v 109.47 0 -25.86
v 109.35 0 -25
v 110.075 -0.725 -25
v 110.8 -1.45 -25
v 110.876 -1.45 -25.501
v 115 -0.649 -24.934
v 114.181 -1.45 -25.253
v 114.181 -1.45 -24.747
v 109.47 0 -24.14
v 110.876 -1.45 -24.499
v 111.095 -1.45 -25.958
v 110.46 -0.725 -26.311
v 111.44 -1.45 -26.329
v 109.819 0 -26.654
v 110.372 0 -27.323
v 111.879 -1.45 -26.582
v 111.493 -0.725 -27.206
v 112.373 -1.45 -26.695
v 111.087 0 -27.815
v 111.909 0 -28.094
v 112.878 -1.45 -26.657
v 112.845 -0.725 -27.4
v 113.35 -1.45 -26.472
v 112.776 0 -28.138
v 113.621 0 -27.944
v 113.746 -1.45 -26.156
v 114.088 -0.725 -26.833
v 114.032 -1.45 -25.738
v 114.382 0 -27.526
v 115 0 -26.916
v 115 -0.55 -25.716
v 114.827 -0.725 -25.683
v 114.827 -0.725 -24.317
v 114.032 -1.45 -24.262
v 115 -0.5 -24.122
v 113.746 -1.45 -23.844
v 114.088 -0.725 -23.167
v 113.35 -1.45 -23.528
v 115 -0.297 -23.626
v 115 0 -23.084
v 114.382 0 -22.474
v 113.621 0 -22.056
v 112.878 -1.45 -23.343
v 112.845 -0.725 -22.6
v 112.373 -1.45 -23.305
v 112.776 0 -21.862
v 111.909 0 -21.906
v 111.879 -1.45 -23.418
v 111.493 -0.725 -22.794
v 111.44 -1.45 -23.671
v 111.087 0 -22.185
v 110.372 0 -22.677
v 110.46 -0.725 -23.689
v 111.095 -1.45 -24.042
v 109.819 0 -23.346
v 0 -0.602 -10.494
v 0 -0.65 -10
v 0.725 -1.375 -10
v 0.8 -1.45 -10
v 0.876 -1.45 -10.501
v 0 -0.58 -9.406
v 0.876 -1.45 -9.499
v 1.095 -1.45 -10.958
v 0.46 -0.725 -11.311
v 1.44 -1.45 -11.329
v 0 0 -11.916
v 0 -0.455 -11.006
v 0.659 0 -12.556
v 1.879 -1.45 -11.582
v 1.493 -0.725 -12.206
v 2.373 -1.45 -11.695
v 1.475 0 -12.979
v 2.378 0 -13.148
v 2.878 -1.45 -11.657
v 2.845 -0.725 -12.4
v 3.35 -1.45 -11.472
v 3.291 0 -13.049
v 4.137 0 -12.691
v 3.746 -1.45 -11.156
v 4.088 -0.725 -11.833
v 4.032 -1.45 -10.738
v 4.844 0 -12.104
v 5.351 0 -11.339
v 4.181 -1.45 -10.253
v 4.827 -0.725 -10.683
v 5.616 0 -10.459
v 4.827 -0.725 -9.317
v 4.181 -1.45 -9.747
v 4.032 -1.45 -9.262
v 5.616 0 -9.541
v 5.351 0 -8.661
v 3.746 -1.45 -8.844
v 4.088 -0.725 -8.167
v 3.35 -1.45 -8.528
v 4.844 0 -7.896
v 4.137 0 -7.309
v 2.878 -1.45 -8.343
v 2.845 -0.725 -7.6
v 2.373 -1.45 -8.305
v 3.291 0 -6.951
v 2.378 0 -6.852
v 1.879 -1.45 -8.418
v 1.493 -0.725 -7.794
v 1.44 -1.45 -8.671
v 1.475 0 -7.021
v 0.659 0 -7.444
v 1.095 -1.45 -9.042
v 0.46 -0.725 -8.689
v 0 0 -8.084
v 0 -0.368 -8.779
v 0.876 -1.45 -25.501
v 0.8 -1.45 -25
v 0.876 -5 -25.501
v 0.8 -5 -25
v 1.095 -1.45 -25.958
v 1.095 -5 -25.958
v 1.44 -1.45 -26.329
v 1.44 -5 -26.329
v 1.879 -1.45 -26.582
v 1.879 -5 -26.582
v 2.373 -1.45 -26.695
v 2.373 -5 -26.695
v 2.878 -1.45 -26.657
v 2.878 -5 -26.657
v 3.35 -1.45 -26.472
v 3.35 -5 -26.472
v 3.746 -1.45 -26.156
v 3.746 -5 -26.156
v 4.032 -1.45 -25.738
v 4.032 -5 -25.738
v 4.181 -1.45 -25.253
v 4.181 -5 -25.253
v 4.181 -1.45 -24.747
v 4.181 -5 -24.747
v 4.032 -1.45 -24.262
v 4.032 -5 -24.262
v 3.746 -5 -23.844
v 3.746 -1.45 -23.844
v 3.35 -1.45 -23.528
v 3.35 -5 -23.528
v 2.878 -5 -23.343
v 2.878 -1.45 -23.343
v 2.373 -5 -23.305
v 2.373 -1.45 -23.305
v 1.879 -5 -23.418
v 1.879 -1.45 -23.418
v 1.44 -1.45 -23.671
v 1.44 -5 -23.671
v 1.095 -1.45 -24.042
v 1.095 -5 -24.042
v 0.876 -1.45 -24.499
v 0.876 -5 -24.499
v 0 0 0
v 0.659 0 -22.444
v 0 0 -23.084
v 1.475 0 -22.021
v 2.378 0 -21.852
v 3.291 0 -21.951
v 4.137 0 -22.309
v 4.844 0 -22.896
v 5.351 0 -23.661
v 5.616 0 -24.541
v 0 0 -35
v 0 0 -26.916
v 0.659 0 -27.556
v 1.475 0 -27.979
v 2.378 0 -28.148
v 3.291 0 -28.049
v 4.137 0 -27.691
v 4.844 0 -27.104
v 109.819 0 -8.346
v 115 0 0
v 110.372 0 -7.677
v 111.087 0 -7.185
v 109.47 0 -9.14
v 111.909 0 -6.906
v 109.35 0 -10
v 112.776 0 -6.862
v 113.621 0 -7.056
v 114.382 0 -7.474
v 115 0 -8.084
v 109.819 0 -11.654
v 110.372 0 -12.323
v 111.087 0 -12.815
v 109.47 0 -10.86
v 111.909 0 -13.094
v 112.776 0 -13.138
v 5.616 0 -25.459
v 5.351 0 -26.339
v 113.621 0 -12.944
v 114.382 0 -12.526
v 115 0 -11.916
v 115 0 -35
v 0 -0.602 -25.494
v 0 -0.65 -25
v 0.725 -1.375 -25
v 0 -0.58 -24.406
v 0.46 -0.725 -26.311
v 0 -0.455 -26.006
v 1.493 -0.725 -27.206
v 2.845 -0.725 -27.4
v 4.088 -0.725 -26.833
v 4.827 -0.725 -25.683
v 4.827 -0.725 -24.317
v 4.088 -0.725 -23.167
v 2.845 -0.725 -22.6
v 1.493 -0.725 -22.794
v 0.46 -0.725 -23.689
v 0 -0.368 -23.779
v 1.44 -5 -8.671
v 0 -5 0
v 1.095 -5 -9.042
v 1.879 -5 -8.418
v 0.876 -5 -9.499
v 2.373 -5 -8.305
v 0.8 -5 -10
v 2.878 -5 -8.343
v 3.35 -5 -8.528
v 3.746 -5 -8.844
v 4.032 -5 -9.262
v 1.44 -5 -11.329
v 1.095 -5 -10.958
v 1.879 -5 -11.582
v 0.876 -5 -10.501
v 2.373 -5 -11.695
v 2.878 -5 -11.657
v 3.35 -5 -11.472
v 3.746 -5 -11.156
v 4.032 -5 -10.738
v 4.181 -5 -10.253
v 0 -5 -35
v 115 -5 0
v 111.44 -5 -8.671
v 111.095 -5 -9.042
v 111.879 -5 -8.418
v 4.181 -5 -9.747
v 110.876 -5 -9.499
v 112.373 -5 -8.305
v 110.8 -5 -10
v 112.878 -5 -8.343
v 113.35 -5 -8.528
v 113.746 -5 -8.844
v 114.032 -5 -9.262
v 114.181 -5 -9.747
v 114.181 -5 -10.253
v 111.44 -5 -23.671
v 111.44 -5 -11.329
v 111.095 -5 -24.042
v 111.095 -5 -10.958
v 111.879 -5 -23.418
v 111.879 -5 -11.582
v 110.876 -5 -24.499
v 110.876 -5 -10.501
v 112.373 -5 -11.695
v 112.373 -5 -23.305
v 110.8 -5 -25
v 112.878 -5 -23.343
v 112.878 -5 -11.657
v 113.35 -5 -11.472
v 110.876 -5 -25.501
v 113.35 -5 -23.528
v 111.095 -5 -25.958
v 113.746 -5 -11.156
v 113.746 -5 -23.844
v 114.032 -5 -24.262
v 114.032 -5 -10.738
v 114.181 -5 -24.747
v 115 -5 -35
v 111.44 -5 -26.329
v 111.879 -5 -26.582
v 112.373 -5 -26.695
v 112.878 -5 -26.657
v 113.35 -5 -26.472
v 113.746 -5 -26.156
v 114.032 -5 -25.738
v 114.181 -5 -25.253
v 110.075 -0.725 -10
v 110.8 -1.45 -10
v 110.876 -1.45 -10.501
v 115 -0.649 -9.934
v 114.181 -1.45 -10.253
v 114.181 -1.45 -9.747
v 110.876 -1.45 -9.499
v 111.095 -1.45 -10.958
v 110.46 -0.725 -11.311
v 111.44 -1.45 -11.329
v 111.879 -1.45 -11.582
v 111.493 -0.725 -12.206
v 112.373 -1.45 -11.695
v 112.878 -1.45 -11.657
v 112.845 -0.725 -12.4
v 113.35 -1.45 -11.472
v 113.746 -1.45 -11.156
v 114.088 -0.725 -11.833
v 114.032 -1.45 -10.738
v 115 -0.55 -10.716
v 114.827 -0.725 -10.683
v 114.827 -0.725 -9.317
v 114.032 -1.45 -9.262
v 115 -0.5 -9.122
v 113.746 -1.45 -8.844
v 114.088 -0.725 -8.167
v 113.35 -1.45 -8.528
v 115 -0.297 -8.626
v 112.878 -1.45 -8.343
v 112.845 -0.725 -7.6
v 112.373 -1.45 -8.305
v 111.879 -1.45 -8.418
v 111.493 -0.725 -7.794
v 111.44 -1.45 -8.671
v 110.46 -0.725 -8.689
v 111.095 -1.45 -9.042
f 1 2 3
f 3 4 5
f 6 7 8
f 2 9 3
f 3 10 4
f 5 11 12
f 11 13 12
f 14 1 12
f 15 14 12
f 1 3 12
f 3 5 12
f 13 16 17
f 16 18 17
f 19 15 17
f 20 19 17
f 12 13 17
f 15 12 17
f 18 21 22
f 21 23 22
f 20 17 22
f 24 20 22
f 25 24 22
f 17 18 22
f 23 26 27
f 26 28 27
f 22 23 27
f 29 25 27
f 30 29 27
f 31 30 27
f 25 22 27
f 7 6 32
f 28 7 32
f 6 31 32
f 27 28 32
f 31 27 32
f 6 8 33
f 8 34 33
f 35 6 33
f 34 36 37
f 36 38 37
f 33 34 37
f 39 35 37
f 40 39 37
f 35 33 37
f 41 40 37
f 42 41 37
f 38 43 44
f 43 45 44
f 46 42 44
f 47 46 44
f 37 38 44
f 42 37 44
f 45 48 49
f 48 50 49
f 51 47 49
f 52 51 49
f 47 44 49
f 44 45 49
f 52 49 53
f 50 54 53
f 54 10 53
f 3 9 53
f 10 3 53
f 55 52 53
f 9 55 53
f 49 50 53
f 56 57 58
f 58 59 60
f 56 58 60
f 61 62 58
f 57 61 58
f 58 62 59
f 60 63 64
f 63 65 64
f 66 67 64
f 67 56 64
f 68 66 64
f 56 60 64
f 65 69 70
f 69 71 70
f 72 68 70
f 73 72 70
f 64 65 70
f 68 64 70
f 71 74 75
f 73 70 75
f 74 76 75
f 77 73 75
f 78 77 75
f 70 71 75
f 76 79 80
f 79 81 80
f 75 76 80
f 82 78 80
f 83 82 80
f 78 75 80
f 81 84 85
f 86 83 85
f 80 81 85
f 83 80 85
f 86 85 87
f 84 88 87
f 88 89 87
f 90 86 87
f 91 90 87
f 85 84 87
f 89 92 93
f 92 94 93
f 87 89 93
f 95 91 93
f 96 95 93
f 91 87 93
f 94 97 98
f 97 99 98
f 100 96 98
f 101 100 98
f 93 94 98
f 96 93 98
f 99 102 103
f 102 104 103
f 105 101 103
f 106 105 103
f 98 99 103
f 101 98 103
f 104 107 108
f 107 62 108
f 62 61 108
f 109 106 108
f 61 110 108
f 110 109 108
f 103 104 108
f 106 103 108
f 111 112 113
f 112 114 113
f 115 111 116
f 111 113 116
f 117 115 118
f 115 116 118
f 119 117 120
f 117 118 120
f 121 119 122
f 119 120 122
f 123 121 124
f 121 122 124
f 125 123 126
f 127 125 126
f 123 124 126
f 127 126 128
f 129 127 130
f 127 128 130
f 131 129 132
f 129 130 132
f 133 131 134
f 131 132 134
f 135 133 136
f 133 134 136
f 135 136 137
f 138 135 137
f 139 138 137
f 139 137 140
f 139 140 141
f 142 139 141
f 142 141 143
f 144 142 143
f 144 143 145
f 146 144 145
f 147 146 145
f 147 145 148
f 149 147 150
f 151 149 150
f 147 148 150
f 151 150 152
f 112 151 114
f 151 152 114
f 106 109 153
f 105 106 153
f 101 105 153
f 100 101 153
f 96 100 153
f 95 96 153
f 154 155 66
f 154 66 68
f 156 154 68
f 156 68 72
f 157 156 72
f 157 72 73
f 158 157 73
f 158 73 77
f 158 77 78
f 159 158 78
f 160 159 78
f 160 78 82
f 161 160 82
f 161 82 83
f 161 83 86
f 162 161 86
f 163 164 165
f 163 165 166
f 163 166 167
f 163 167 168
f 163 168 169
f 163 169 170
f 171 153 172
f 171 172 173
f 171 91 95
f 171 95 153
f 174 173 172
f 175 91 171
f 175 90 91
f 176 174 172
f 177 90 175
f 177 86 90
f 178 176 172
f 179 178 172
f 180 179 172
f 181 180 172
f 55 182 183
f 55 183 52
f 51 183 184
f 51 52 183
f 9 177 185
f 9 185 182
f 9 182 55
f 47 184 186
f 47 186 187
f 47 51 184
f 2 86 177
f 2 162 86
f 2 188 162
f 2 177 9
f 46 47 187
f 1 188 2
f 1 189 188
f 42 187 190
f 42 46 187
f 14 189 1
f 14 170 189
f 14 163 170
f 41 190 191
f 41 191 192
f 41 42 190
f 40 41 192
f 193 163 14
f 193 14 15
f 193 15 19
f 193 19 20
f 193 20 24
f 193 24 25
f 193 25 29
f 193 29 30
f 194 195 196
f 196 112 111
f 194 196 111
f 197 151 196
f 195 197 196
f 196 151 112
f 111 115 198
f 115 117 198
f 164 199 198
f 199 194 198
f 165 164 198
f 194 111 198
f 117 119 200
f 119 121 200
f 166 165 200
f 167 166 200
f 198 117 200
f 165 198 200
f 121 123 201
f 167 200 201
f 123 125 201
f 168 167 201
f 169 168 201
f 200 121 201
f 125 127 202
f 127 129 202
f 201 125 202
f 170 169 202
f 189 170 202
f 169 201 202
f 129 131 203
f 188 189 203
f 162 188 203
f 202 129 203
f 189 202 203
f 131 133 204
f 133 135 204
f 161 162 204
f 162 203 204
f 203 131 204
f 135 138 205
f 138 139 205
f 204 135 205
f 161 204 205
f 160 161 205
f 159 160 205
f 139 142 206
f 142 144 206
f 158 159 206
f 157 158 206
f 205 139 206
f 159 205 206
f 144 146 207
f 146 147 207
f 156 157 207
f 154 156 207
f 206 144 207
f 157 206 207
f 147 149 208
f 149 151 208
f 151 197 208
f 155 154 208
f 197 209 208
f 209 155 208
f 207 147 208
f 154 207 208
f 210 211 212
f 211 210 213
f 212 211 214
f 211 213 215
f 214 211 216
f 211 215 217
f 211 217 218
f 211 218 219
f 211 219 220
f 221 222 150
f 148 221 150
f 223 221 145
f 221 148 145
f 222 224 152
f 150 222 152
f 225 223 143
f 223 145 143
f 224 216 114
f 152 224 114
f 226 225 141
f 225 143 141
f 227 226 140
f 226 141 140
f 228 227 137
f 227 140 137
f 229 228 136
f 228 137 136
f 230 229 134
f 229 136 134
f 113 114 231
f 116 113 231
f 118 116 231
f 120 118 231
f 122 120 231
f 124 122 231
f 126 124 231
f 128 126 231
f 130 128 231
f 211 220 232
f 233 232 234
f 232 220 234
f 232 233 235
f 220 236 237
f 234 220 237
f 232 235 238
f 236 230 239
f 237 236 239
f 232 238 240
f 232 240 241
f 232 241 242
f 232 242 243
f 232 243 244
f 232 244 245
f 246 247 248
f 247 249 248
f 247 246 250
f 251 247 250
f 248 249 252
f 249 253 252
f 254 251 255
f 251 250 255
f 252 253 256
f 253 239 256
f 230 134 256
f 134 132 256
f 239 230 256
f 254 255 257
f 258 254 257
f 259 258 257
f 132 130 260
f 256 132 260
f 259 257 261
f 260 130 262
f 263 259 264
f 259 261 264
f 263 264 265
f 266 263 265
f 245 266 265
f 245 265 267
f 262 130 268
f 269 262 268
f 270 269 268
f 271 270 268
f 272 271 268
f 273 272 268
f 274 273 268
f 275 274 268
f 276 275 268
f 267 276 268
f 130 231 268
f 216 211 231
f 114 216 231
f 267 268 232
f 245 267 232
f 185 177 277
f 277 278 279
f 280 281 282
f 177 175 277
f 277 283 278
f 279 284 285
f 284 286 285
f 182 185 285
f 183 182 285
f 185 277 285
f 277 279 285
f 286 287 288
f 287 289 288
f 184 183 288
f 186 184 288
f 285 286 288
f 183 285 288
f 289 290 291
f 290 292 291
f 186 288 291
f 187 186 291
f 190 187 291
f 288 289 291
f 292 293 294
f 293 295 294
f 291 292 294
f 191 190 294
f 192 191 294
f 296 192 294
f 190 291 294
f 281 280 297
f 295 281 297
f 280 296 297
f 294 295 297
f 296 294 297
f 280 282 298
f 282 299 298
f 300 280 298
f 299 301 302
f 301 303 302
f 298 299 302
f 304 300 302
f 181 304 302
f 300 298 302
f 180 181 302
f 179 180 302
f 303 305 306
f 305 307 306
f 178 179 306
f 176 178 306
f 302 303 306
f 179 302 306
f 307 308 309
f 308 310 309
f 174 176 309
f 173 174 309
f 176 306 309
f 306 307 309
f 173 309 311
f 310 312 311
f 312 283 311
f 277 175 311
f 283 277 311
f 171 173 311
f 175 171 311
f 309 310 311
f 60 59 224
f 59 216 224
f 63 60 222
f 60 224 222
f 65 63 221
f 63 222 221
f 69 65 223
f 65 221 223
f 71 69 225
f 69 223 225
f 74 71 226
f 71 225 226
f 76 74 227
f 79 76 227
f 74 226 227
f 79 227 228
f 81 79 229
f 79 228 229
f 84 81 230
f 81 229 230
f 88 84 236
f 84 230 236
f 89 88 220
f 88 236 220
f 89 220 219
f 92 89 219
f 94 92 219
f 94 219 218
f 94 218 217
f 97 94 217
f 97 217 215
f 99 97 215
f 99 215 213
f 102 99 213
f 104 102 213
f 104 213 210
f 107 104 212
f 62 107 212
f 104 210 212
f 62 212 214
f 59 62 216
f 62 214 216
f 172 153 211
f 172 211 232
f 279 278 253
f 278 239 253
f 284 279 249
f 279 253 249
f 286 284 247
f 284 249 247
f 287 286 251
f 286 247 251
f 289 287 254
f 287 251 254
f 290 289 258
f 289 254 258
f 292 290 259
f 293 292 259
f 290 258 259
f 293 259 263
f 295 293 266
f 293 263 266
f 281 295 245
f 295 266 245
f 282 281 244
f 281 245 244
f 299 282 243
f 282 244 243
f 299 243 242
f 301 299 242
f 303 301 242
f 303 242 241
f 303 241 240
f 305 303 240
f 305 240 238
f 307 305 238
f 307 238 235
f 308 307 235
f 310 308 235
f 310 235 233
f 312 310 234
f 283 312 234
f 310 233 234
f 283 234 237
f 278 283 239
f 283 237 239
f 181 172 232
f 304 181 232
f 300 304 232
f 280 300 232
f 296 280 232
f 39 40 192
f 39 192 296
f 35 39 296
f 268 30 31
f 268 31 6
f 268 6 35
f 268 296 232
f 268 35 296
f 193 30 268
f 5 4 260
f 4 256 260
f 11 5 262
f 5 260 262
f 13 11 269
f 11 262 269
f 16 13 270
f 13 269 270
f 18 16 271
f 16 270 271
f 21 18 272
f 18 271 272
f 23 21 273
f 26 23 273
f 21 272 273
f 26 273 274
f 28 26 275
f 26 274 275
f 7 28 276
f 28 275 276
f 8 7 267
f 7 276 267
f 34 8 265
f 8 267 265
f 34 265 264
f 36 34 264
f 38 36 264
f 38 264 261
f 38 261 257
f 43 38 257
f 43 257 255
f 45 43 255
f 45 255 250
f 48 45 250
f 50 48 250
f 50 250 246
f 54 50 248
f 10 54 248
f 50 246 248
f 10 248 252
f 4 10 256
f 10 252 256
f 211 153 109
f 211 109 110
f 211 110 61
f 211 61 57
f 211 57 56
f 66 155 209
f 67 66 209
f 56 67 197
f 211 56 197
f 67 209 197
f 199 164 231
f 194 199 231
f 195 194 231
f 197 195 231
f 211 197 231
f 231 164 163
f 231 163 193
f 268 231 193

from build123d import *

# Parameters (mm, degrees)
SKETCH1_W                                           = 115
SKETCH1_H                                           = 35
BOSS_EXTRUDE1_DEPTH                                 = 5
CSK_FOR_M3_FLAT_COUNTERSUNK_HEAD_SCREW1_D           = 3.4
CSK_FOR_M3_FLAT_COUNTERSUNK_HEAD_SCREW1_CSINK_D     = 6.3
CSK_FOR_M3_FLAT_COUNTERSUNK_HEAD_SCREW1_CSINK_ANGLE = 90


with BuildPart() as part:
    # Sketch1 → Boss-Extrude1 (new body)
    with BuildSketch(Plane(origin=(0, 0, 0), x_dir=(1, 0, 0), z_dir=(0, 1, 0))):
        with Locations((57.5, 17.5)):
            Rectangle(SKETCH1_W, SKETCH1_H)
    extrude(amount=-BOSS_EXTRUDE1_DEPTH)

    # CSK for M3 Flat Countersunk Head Screw1 (through all)
    with Locations(Plane(origin=(0, 0, 0), x_dir=(1, 0, 0), z_dir=(0, 1, 0))):
        with Locations((2.5, 25), (2.5, 10), (112.5, 25), (112.5, 10)):
            CounterSinkHole(CSK_FOR_M3_FLAT_COUNTERSUNK_HEAD_SCREW1_D / 2, CSK_FOR_M3_FLAT_COUNTERSUNK_HEAD_SCREW1_CSINK_D / 2, counter_sink_angle=CSK_FOR_M3_FLAT_COUNTERSUNK_HEAD_SCREW1_CSINK_ANGLE)


solid = part.part
